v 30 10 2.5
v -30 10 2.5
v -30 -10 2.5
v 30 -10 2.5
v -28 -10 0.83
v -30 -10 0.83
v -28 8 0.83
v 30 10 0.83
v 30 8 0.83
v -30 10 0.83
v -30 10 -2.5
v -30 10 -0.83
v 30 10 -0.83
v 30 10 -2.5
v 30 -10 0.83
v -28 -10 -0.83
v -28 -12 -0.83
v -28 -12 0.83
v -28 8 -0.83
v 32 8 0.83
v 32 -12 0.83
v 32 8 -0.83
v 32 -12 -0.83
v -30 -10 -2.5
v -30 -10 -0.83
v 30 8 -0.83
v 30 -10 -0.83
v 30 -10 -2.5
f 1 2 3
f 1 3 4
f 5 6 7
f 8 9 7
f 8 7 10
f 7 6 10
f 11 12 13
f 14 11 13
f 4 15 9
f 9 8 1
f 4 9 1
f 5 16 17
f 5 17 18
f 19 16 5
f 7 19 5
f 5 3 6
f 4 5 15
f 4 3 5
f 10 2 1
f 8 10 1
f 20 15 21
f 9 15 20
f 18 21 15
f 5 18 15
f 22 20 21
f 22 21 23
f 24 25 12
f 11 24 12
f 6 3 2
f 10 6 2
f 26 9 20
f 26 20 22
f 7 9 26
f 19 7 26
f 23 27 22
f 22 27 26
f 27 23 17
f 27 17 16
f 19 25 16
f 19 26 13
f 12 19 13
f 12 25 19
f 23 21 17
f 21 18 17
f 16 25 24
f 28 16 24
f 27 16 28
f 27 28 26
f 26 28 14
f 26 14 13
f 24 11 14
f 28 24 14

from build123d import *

# Parameters (mm, degrees)
SKETCH1_W           = 60
SKETCH1_H           = 20
BOSS_EXTRUDE1_DEPTH = 2.5
SKETCH2_W           = 60
SKETCH2_H           = 1.66
CUT_EXTRUDE1_DEPTH  = 2
SKETCH3_W           = 1.66
SKETCH3_H           = 18
CUT_EXTRUDE2_DEPTH  = 2
SKETCH4_W           = 58
SKETCH4_H           = 1.66
BOSS_EXTRUDE2_DEPTH = 2
SKETCH5_W           = 1.66
SKETCH5_H           = 20
BOSS_EXTRUDE3_DEPTH = 2


with BuildPart() as part:
    # Sketch1 → Boss-Extrude1 (new, symmetric)
    with BuildSketch(Plane.XY):
        Rectangle(SKETCH1_W, SKETCH1_H)
    extrude(amount=BOSS_EXTRUDE1_DEPTH, both=True)

    # Sketch2 → Cut-Extrude1 (cut)
    with BuildSketch(Plane(origin=(0, 10, 0), x_dir=(1, 0, 0), z_dir=(0, 1, 0))):
        Rectangle(SKETCH2_W, SKETCH2_H)
    extrude(amount=-CUT_EXTRUDE1_DEPTH, mode=Mode.SUBTRACT)

    # Sketch3 → Cut-Extrude2 (cut)
    with BuildSketch(Plane.ZY.offset(30)):
        with Locations((0, -1)):
            Rectangle(SKETCH3_W, SKETCH3_H)
    extrude(amount=-CUT_EXTRUDE2_DEPTH, mode=Mode.SUBTRACT)

    # Sketch4 → Boss-Extrude2 (add)
    with BuildSketch(Plane.XZ.offset(10)):
        with Locations((1, 0)):
            Rectangle(SKETCH4_W, SKETCH4_H)
    extrude(amount=BOSS_EXTRUDE2_DEPTH)

    # Sketch5 → Boss-Extrude3 (add)
    with BuildSketch(Plane(origin=(30, 0, 0), x_dir=(0, 0, -1), z_dir=(1, 0, 0))):
        with Locations((0, -2)):
            Rectangle(SKETCH5_W, SKETCH5_H)
    extrude(amount=BOSS_EXTRUDE3_DEPTH)


solid = part.part
